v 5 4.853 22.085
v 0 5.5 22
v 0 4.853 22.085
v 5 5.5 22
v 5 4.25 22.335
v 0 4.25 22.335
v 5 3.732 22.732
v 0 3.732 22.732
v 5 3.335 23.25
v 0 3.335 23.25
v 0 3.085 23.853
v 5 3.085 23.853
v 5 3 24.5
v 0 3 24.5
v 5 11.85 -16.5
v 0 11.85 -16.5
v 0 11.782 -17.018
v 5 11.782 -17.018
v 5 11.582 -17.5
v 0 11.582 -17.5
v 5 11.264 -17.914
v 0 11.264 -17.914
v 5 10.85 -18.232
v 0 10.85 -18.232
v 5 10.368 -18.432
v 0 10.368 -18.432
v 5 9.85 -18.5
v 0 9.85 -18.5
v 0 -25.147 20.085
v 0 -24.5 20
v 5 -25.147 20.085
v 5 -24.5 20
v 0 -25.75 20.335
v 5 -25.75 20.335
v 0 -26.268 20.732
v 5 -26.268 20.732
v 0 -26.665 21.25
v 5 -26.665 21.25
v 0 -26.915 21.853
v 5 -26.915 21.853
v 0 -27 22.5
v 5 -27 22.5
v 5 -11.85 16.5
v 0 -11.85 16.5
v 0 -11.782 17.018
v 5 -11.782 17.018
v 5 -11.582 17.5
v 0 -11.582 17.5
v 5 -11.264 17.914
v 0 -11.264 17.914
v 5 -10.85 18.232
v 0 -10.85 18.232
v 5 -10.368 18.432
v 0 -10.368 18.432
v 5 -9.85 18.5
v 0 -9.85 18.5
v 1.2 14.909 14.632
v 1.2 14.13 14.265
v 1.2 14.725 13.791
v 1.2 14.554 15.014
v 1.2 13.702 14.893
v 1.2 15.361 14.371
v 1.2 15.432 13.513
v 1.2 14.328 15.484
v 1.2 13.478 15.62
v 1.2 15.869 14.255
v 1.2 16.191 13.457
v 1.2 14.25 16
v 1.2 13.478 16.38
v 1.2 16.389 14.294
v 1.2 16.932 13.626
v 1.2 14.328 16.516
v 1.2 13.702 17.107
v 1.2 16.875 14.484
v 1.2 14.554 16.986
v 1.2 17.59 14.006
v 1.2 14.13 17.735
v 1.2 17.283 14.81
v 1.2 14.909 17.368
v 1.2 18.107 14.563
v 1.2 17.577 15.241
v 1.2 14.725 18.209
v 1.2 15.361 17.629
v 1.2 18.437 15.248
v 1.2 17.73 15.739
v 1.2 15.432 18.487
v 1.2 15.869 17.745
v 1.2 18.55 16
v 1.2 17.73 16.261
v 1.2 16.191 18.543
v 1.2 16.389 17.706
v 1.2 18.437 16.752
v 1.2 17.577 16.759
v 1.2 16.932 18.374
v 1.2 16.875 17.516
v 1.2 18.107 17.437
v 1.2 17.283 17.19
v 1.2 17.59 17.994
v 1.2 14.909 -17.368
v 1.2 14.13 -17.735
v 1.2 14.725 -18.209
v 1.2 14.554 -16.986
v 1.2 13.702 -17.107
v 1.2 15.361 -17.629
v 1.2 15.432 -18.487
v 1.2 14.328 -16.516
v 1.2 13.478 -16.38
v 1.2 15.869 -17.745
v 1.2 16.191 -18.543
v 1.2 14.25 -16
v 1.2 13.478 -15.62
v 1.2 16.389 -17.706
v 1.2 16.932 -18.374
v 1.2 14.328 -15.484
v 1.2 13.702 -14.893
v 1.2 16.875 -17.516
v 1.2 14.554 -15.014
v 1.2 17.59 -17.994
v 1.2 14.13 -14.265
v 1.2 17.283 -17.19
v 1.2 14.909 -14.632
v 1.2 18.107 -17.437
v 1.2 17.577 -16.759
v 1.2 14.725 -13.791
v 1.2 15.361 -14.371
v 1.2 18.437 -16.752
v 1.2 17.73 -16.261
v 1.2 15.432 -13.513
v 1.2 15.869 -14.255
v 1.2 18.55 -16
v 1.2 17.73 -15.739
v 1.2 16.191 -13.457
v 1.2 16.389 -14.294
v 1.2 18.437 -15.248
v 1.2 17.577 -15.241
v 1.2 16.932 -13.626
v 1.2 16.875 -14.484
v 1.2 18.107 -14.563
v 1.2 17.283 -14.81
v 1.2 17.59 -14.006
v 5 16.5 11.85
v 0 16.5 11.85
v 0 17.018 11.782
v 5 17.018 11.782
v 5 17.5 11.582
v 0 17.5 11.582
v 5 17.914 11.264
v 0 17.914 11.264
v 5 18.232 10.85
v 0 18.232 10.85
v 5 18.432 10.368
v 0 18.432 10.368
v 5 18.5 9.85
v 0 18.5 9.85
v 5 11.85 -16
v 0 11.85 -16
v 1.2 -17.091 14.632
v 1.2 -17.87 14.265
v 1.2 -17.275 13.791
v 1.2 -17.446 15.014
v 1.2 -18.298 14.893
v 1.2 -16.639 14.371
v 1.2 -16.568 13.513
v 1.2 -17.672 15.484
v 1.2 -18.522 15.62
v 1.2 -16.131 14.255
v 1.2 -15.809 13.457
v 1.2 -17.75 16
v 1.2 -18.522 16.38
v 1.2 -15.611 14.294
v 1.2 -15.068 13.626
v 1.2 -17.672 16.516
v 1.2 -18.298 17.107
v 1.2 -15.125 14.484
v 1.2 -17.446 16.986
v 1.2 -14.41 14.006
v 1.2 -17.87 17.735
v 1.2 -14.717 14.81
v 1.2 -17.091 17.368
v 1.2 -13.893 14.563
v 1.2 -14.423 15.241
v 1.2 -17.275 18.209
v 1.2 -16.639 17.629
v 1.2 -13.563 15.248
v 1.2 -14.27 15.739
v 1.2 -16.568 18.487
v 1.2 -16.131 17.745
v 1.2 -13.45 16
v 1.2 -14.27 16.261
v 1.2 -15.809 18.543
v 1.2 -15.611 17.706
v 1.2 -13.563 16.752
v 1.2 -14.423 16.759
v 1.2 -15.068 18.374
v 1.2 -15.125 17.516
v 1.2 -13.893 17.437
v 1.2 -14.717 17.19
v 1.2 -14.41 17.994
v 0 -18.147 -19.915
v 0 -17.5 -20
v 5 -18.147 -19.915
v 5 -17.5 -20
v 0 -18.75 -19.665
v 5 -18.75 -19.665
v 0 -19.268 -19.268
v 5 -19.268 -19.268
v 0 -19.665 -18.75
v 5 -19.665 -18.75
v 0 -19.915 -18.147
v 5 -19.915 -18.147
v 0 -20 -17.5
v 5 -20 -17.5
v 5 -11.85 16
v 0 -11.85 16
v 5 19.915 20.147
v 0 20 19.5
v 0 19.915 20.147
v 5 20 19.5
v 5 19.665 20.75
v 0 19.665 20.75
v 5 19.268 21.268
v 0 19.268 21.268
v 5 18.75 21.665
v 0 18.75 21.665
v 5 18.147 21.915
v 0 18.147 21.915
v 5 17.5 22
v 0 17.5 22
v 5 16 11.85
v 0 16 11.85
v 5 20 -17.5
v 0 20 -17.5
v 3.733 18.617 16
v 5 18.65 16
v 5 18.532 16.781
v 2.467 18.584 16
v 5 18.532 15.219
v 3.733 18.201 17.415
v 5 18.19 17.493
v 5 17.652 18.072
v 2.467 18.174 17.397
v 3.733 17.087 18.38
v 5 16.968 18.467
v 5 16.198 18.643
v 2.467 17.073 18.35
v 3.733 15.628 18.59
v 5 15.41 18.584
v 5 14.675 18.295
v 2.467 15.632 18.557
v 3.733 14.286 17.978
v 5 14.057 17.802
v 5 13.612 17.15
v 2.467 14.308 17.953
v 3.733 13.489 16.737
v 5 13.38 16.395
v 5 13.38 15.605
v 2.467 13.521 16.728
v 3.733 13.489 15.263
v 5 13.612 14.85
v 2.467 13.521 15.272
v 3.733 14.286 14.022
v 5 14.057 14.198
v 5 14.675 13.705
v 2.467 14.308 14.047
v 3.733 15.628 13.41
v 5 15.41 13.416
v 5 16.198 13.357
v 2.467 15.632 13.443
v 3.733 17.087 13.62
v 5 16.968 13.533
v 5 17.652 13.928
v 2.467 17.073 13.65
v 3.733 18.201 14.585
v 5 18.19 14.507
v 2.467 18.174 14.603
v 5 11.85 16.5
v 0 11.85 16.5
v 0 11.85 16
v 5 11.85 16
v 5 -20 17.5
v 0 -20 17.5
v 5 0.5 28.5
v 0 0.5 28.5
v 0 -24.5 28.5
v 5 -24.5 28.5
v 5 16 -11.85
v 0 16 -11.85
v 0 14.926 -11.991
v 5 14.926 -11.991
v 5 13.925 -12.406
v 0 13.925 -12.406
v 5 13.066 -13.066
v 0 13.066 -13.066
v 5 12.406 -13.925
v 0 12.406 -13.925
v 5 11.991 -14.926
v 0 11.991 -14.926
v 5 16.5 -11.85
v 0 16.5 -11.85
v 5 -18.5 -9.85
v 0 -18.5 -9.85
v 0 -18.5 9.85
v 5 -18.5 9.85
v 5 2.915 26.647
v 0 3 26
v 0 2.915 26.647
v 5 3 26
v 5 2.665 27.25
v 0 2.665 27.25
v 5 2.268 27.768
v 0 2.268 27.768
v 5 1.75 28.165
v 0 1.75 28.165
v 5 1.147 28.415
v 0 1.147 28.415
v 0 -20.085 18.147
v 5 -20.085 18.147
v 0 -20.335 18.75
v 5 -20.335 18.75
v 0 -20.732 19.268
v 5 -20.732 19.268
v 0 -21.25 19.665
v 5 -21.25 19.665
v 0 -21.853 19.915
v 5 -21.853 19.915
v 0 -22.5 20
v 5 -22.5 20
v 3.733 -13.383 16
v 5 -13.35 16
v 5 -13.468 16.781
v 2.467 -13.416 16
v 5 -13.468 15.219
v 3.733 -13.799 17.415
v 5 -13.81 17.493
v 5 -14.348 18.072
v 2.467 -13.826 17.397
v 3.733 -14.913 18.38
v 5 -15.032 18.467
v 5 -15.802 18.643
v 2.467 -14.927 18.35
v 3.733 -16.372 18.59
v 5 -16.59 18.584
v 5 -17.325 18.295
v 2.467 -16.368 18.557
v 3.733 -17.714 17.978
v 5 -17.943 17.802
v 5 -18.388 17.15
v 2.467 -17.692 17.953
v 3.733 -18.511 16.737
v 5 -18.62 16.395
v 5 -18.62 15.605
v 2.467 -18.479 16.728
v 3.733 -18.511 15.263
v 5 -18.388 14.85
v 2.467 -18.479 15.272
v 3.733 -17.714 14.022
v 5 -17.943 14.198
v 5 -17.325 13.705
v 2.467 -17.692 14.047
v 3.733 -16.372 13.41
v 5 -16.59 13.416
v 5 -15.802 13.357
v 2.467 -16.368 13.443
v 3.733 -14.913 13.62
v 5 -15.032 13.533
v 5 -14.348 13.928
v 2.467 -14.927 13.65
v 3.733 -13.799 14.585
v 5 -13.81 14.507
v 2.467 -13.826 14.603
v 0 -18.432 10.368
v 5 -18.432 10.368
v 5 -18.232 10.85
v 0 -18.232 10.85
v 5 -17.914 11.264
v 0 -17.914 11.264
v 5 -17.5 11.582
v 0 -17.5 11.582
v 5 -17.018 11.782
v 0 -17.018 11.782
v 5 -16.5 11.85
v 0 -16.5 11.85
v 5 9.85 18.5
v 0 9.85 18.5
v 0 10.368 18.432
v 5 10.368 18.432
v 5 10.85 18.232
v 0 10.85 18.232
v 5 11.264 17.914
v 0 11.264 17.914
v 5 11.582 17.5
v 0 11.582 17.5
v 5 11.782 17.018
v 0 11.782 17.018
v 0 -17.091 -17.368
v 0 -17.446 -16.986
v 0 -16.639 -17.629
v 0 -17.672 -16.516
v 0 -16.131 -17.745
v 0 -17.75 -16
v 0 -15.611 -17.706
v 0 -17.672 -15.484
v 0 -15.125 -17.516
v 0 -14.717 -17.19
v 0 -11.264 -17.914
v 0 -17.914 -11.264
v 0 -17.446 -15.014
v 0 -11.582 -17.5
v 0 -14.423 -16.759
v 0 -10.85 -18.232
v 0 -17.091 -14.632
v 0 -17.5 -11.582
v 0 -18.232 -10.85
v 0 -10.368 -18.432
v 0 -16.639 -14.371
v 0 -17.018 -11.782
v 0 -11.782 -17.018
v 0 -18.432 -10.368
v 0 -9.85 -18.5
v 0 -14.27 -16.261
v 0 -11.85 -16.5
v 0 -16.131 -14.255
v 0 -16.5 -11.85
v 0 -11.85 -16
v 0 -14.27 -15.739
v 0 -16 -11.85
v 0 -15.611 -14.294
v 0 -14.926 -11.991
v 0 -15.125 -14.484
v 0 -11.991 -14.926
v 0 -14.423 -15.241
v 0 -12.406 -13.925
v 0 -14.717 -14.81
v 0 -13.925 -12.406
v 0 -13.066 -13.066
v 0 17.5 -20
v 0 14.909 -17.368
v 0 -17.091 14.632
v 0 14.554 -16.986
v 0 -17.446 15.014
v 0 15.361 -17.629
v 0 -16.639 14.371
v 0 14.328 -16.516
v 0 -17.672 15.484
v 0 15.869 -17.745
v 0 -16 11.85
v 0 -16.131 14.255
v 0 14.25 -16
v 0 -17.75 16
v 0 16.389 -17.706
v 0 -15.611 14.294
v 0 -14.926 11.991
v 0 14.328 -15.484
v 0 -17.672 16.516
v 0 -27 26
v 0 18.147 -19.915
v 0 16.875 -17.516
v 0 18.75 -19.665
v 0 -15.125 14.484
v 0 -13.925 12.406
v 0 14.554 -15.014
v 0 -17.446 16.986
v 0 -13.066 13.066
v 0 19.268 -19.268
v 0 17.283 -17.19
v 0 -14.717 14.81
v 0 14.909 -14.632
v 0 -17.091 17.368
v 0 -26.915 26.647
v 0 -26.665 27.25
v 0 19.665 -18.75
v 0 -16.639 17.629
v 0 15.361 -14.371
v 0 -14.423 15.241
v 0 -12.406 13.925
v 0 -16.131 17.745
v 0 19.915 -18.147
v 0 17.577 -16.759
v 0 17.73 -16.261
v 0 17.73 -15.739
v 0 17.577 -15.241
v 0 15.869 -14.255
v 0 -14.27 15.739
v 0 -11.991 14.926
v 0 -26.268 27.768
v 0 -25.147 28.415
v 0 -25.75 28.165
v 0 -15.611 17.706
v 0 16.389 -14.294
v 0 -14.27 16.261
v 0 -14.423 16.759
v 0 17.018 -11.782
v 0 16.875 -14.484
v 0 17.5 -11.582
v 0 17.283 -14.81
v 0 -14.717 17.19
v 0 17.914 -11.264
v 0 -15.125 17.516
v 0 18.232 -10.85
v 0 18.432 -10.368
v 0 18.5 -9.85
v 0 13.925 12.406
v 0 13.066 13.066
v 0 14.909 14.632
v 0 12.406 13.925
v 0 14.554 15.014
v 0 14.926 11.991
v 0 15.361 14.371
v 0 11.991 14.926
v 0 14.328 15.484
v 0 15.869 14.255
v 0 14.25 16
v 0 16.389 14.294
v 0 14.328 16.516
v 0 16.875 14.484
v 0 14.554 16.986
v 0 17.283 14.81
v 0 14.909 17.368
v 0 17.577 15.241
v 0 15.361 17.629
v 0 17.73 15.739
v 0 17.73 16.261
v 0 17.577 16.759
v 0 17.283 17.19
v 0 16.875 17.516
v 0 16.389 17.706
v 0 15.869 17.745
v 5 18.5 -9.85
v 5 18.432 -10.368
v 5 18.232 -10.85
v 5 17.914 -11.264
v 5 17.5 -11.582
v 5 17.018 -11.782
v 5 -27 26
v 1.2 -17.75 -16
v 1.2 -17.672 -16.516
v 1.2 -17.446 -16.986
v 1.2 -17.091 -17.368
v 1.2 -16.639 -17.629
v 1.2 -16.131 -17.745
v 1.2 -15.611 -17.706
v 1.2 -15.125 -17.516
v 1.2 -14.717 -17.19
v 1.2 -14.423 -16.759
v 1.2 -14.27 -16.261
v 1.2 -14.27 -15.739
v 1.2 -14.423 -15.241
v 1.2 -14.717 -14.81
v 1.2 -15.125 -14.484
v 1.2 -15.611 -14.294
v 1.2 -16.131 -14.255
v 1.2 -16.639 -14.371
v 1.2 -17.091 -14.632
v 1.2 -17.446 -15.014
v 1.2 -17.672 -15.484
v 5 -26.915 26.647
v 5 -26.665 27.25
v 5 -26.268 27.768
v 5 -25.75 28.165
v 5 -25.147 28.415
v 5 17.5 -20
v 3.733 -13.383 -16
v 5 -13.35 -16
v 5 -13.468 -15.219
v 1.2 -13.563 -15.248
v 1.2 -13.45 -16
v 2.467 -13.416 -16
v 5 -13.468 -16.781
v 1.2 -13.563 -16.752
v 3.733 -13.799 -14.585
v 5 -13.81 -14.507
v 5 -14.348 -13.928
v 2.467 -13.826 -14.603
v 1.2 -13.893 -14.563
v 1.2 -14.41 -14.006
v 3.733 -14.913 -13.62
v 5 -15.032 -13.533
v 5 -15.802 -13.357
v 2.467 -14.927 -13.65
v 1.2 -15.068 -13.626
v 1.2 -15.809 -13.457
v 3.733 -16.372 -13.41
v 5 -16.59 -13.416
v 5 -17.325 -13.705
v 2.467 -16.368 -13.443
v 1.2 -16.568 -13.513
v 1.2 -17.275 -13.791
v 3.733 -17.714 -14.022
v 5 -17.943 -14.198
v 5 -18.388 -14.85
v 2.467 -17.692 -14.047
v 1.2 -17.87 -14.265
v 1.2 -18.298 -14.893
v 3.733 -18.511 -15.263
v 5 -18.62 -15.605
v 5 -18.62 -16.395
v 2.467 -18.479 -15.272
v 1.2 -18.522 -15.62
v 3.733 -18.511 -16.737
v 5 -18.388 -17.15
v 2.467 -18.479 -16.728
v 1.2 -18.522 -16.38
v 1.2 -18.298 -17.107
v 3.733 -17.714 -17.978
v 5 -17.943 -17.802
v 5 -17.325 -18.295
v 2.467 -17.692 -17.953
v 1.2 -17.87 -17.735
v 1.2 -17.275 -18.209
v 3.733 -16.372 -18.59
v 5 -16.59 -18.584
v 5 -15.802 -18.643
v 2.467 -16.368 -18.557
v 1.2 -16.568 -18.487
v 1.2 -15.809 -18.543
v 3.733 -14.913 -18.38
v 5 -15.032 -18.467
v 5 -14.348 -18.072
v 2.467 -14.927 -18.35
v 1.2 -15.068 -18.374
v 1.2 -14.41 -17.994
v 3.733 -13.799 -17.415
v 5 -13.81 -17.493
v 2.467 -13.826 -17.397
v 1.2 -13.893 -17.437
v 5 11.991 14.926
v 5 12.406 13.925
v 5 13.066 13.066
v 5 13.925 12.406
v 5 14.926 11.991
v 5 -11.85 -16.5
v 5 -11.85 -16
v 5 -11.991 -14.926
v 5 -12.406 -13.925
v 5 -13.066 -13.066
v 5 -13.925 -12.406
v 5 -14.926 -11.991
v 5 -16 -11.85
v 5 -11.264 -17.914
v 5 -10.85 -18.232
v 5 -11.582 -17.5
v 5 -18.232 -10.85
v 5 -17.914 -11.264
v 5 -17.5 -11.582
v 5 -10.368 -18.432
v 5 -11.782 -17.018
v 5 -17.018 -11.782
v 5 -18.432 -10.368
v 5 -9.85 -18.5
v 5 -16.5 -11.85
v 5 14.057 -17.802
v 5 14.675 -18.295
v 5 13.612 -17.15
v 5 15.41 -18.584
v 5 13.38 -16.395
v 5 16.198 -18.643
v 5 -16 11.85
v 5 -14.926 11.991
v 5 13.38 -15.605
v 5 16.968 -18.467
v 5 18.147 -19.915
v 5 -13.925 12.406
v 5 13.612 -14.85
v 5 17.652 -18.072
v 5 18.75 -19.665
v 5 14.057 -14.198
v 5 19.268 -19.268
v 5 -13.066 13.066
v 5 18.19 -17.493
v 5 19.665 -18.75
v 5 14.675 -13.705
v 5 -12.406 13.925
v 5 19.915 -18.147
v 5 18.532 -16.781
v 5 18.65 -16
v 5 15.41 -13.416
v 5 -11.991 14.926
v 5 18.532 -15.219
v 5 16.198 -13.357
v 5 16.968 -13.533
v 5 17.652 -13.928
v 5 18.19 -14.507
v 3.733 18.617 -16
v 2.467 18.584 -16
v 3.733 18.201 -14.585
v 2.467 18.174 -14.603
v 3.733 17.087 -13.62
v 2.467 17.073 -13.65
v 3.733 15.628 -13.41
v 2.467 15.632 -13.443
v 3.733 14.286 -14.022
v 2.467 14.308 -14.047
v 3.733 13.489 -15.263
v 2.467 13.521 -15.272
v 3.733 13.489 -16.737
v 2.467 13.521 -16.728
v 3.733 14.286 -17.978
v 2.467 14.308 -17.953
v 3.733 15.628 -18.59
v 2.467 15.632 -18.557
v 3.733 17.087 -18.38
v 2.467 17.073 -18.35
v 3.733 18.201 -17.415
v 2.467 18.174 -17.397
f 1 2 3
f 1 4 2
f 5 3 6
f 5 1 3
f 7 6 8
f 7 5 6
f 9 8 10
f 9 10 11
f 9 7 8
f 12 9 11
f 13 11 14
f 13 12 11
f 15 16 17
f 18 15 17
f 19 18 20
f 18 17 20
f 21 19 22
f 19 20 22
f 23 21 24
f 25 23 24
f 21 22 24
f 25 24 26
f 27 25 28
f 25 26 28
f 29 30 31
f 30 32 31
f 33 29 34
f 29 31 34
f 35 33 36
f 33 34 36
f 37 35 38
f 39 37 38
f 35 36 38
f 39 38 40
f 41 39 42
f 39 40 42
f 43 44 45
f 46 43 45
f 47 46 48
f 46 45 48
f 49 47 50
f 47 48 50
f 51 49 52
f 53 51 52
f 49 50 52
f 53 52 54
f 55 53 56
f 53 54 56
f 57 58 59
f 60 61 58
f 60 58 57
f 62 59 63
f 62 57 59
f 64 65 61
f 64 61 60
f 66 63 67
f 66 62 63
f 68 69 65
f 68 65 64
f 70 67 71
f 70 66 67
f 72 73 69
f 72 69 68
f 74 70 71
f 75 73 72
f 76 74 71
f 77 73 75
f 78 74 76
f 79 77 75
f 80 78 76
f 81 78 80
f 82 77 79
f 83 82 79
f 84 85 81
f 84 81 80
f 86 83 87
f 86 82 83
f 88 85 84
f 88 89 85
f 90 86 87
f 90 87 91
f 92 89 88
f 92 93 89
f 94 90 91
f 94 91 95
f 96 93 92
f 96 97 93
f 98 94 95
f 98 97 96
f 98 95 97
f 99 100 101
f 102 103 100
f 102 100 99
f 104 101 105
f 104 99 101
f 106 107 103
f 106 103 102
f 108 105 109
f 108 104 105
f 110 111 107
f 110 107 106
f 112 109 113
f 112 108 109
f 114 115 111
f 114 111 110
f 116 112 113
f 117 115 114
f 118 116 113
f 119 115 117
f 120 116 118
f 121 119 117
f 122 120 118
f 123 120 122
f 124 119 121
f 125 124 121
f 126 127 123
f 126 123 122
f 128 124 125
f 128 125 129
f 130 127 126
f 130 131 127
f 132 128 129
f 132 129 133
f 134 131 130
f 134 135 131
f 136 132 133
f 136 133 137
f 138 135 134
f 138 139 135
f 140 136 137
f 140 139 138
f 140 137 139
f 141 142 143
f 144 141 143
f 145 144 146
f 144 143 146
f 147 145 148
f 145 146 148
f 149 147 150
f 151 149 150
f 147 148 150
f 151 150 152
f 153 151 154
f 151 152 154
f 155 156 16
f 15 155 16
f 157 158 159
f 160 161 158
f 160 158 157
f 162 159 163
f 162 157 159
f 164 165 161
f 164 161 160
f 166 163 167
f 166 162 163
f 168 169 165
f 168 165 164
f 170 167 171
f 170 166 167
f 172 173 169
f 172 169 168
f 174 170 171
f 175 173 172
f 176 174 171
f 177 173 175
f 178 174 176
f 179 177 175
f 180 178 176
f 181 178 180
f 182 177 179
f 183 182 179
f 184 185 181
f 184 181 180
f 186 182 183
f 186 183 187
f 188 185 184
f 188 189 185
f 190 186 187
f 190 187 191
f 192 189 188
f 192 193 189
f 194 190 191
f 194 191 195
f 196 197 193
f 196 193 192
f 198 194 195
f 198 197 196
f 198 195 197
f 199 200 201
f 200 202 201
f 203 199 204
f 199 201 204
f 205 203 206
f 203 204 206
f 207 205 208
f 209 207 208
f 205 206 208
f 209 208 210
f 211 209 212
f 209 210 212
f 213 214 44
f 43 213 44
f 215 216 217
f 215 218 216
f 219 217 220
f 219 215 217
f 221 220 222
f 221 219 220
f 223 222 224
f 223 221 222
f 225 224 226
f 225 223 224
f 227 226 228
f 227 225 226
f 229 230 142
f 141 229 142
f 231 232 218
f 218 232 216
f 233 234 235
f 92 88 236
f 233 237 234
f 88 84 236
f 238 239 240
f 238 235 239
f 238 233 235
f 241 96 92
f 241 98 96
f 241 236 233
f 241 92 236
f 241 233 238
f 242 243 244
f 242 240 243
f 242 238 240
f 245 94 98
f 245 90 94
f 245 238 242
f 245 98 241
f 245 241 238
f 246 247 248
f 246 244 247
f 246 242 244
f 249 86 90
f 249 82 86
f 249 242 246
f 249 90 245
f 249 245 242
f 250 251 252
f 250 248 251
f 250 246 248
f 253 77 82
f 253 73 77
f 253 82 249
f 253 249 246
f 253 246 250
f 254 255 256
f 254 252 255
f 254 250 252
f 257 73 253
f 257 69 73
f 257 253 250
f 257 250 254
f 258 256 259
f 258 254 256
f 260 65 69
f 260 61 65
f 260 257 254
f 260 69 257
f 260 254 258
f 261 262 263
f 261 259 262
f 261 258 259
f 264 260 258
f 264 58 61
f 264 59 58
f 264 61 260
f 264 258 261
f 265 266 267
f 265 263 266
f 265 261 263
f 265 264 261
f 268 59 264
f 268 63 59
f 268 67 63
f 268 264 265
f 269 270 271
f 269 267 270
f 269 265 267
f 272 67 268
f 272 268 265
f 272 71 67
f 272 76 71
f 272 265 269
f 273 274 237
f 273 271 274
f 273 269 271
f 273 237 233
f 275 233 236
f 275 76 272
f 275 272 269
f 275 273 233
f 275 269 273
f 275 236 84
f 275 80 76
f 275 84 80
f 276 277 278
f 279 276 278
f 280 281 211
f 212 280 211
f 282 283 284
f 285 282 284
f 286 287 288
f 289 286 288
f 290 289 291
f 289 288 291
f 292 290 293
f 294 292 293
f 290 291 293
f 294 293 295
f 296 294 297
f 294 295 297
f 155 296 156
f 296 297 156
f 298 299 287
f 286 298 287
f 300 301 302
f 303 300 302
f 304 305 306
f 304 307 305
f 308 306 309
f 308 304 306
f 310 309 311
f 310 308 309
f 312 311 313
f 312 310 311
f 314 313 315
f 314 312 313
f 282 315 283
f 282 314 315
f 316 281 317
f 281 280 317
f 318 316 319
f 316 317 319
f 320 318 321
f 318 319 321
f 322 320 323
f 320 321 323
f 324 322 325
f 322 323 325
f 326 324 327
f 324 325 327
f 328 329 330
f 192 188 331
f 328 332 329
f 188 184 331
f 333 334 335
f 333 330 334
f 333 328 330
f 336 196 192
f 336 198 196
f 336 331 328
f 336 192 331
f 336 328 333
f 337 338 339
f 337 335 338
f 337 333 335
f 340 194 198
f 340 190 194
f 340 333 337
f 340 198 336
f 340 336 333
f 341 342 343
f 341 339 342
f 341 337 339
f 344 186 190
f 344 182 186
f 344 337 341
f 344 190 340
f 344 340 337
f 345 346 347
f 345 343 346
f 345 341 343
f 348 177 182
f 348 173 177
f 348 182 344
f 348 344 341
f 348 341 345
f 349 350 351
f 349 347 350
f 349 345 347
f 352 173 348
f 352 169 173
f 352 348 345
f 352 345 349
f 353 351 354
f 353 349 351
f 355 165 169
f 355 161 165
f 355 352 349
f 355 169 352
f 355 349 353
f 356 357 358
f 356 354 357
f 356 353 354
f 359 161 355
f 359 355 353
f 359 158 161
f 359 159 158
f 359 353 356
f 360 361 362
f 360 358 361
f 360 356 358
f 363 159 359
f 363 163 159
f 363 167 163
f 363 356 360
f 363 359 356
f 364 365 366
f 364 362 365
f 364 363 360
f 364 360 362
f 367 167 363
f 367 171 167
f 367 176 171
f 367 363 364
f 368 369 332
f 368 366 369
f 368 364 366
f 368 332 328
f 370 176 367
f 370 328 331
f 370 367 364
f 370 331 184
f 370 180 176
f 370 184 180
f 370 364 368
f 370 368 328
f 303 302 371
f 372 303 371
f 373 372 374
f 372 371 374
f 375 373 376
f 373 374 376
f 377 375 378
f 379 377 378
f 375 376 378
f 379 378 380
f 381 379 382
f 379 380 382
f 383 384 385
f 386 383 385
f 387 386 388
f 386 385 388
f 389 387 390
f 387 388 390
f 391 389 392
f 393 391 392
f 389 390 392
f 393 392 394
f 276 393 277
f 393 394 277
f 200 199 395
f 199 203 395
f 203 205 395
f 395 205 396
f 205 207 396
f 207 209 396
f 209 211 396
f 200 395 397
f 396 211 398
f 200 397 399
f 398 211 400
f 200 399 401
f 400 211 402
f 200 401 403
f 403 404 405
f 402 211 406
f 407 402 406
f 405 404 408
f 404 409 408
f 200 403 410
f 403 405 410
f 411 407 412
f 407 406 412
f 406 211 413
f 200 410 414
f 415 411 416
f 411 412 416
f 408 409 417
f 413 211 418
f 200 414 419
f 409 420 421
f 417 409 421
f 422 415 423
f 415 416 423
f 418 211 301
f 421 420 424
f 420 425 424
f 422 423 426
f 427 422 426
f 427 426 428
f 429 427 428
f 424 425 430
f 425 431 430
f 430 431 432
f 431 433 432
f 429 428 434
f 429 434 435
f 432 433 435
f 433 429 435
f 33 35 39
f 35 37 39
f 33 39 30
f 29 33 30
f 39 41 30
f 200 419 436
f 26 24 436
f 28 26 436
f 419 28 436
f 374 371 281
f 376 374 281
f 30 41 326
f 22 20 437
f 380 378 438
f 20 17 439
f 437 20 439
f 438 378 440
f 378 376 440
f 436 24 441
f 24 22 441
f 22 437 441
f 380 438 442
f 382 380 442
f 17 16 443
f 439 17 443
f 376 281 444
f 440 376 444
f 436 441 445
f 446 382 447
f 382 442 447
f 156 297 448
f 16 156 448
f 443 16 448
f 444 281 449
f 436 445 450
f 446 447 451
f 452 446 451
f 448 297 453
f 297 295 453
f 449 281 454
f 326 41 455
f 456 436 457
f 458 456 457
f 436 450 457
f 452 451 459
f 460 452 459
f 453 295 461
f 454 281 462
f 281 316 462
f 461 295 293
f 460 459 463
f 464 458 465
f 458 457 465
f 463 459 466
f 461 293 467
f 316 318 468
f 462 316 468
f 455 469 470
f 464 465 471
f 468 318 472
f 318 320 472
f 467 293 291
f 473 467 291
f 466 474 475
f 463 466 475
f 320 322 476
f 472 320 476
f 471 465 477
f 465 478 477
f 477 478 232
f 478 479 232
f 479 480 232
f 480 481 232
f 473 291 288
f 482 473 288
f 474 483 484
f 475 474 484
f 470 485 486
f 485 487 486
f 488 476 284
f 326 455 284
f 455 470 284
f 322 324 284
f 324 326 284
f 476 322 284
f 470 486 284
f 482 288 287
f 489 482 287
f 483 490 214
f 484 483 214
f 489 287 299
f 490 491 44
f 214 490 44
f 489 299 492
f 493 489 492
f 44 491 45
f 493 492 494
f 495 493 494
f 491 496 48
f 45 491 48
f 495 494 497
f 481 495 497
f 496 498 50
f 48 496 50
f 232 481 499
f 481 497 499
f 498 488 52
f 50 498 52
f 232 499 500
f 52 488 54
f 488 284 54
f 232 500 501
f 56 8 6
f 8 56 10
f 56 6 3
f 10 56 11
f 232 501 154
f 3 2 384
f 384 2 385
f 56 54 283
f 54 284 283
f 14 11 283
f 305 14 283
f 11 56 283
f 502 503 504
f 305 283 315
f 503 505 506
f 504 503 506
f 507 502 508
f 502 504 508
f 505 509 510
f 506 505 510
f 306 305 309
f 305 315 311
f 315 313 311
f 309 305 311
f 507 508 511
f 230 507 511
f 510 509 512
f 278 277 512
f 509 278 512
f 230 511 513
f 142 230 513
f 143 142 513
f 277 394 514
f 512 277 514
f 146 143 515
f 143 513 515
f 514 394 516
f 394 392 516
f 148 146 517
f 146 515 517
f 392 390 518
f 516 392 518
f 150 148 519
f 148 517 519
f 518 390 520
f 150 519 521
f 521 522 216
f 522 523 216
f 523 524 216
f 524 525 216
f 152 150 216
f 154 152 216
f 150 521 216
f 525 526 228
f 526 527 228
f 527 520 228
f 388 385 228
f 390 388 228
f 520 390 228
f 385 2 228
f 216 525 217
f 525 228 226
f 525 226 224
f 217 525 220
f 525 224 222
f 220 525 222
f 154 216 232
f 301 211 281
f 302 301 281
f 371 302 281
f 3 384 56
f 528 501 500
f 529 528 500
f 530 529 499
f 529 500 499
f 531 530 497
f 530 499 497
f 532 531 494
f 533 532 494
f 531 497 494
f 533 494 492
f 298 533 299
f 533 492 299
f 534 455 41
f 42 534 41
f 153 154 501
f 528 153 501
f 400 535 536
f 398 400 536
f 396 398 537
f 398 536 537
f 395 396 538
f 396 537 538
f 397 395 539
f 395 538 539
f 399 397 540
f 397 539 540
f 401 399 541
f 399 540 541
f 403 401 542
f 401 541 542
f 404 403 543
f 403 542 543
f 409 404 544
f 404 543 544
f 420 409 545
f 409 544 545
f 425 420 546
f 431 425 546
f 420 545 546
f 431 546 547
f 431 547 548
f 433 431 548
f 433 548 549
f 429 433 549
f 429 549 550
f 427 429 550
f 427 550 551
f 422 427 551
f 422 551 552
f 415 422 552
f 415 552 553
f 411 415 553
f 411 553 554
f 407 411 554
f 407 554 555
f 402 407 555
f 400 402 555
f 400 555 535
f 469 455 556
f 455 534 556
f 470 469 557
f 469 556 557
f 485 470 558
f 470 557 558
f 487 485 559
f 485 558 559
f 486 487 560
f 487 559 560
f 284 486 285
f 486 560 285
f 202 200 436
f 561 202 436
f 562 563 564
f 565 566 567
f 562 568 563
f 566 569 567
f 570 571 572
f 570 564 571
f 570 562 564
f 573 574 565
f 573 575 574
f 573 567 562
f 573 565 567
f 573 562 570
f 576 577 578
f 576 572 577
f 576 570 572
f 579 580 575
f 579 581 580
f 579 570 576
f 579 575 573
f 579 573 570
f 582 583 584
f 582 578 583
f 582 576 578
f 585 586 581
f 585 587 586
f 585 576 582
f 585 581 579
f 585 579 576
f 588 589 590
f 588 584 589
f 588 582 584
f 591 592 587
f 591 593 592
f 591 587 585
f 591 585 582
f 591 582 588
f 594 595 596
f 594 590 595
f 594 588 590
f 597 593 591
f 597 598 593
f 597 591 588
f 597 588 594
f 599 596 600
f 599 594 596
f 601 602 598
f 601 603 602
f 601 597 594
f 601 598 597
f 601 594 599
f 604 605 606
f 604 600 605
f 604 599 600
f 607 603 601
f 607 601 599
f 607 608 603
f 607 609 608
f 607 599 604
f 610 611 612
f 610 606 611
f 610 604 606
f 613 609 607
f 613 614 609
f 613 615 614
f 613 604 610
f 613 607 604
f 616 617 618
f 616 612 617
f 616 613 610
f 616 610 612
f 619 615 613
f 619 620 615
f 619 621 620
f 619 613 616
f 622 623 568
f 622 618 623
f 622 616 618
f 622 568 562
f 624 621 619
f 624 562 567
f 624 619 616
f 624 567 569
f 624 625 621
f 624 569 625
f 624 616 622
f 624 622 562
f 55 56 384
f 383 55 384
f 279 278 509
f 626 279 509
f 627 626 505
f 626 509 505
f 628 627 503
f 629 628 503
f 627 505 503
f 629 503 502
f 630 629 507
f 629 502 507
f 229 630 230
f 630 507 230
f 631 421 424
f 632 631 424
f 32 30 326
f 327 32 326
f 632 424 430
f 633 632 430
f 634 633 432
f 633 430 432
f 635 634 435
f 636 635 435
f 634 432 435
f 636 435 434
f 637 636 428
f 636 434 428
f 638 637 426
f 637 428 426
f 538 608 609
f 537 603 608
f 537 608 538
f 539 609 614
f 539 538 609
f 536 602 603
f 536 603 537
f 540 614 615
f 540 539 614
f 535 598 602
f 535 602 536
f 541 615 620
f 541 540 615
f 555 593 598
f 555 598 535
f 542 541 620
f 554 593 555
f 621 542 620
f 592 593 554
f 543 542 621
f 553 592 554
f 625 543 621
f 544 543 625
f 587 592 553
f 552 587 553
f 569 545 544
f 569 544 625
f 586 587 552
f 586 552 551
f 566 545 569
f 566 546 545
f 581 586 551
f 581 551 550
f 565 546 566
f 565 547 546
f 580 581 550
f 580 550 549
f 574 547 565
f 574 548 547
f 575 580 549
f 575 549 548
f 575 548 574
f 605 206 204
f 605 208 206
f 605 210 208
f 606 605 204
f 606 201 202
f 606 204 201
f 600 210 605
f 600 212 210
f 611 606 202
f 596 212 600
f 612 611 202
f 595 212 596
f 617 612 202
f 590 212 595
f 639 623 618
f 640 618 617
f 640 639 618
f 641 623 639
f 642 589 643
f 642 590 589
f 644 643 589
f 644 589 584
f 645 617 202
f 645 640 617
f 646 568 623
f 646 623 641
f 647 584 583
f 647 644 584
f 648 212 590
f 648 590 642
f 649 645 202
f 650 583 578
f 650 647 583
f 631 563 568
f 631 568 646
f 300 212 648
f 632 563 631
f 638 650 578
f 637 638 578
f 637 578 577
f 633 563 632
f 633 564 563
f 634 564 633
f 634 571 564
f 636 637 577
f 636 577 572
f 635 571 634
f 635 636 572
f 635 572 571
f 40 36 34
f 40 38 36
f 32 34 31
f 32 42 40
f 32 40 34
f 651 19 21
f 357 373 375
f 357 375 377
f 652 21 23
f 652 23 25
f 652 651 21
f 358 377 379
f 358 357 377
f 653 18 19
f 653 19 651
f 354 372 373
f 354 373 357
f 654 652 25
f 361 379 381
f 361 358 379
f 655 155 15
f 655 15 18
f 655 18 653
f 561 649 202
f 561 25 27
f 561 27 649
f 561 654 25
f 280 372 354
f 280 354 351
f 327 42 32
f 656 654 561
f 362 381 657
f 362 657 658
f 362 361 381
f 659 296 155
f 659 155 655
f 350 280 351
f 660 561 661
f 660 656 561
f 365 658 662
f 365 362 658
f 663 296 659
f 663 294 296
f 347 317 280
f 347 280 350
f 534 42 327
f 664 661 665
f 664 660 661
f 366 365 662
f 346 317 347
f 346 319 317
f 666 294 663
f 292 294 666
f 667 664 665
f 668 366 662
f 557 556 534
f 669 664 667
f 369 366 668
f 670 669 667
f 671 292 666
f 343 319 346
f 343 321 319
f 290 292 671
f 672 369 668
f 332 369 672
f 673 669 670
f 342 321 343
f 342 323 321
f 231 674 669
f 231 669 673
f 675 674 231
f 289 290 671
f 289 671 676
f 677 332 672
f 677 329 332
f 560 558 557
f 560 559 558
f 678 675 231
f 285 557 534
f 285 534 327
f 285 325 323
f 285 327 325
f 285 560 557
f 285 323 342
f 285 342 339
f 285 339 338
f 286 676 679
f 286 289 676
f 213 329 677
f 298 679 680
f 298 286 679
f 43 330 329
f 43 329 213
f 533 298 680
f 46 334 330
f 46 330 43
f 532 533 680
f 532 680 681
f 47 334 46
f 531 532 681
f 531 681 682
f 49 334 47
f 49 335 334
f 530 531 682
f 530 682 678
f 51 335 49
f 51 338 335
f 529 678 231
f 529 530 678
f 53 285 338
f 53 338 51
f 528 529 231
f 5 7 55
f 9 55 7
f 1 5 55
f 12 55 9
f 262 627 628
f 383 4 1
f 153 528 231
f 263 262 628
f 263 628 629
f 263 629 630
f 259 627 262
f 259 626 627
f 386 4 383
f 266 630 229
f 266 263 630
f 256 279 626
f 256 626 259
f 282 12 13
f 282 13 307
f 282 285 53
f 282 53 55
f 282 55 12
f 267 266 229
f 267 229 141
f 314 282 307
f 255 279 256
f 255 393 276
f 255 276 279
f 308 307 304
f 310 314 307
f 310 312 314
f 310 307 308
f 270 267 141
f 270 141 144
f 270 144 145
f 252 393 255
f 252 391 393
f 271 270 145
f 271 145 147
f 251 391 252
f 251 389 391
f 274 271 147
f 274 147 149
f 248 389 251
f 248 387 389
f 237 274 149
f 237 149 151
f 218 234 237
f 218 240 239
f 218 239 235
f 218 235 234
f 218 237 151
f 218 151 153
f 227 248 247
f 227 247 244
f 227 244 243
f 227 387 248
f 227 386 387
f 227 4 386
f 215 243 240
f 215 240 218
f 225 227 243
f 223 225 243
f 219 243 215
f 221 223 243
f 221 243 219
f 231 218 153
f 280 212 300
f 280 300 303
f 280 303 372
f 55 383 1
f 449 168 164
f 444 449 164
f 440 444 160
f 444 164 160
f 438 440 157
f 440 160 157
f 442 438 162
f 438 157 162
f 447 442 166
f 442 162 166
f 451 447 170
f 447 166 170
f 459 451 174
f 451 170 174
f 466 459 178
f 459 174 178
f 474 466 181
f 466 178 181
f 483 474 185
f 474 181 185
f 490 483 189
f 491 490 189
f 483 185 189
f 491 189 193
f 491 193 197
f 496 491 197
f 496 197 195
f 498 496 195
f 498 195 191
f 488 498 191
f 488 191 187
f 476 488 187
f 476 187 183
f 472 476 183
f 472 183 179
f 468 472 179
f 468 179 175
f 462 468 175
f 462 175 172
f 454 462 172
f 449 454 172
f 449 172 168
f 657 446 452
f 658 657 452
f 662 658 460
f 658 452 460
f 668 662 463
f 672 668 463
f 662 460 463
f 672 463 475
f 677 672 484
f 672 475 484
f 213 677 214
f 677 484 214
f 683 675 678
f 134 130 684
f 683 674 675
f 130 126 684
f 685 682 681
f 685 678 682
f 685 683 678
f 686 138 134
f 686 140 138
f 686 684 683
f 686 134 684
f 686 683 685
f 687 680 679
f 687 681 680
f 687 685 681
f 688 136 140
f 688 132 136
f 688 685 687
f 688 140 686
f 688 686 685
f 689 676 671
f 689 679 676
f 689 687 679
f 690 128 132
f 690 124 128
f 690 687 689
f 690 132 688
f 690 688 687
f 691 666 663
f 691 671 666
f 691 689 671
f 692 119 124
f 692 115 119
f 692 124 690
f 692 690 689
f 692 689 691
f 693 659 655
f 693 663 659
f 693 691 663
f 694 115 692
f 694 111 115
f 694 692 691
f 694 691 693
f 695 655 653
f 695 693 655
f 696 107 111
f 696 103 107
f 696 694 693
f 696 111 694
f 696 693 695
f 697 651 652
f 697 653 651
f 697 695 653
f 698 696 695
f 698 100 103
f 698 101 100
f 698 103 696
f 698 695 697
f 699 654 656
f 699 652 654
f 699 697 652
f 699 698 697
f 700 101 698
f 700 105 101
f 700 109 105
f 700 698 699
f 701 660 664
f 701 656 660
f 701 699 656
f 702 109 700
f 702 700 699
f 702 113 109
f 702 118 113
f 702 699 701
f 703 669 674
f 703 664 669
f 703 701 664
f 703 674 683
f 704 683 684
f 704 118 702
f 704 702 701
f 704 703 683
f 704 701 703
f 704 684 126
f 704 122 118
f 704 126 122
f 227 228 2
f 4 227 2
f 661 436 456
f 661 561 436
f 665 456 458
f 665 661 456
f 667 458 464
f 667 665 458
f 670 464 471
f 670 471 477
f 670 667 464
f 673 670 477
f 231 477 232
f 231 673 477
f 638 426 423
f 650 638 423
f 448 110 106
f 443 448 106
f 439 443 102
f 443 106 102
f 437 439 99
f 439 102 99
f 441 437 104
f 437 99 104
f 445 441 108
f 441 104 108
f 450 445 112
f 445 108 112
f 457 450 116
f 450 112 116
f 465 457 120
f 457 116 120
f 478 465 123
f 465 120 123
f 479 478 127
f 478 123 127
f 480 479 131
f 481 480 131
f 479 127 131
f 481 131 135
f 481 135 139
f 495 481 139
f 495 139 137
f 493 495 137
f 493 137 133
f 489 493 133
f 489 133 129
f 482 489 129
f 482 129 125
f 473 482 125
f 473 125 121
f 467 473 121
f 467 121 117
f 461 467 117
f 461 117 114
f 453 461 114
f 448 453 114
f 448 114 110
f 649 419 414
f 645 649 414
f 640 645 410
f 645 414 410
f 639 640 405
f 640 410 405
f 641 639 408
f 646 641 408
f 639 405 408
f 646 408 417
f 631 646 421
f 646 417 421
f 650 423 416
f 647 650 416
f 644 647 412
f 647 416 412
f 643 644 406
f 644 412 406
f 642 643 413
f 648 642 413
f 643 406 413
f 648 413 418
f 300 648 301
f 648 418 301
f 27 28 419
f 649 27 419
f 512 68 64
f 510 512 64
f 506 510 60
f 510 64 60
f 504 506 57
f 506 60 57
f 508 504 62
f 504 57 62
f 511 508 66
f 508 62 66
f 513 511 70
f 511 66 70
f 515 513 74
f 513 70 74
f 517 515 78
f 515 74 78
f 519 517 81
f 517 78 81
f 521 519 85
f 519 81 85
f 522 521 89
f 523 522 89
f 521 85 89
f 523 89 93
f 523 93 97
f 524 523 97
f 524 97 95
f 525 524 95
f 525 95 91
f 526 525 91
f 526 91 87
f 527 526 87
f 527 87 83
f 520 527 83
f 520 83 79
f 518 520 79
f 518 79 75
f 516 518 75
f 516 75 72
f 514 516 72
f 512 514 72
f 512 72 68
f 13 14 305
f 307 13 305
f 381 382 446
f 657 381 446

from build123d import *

# Parameters (mm, degrees)
F0_R     = 2.15
F0_W     = 17
F0_H     = 2
F0_W_2   = 23
F1_DEPTH = 5
F2_R     = 2.65
F3_DEPTH = 3.8
F3_TAPER = 1.5
F4_D     = 3.5
F5_R     = 2.5


with BuildPart() as f1:
    # F0 (on Right) → F1 (new body)
    with BuildSketch(Plane.YZ):
        Polygon((-20, -20), (20, -20), (20, 20), (3, 20), (-20, 20), align=None)
        with Locations((-16, -16)):
            Circle(F0_R, mode=Mode.SUBTRACT)
        with Locations((16, -16)):
            Circle(F0_R, mode=Mode.SUBTRACT)
        with BuildLine():
            Line((11.85, 16.5), (11.85, 16))
            ThreePointArc((11.85, 16), (13.0655068581, 13.0655068581), (16, 11.85))
            Line((16, 11.85), (16.5, 11.85))
            ThreePointArc((16.5, 11.85), (17.9142135624, 11.2642135624), (18.5, 9.85))
            Line((18.5, 9.85), (18.5, -9.85))
            ThreePointArc((18.5, -9.85), (17.9142135624, -11.2642135624), (16.5, -11.85))
            Line((16.5, -11.85), (16, -11.85))
            ThreePointArc((16, -11.85), (13.0655068581, -13.0655068581), (11.85, -16))
            Line((11.85, -16), (11.85, -16.5))
            ThreePointArc((11.85, -16.5), (11.2642135624, -17.9142135624), (9.85, -18.5))
            Line((9.85, -18.5), (-9.85, -18.5))
            ThreePointArc((-9.85, -18.5), (-11.2642135624, -17.9142135624), (-11.85, -16.5))
            Line((-11.85, -16.5), (-11.85, -16))
            ThreePointArc((-11.85, -16), (-13.0655068581, -13.0655068581), (-16, -11.85))
            Line((-16, -11.85), (-16.5, -11.85))
            ThreePointArc((-16.5, -11.85), (-17.9142135624, -11.2642135624), (-18.5, -9.85))
            Line((-18.5, -9.85), (-18.5, 9.85))
            ThreePointArc((-18.5, 9.85), (-17.9142135624, 11.2642135624), (-16.5, 11.85))
            Line((-16.5, 11.85), (-16, 11.85))
            ThreePointArc((-16, 11.85), (-13.0655068581, 13.0655068581), (-11.85, 16))
            Line((-11.85, 16), (-11.85, 16.5))
            ThreePointArc((-11.85, 16.5), (-11.2642135624, 17.9142135624), (-9.85, 18.5))
            Line((-9.85, 18.5), (9.85, 18.5))
            ThreePointArc((9.85, 18.5), (11.2642135624, 17.9142135624), (11.85, 16.5))
        make_face(mode=Mode.SUBTRACT)
        with Locations((-16, 16)):
            Circle(F0_R, mode=Mode.SUBTRACT)
        with Locations((16, 16)):
            Circle(F0_R, mode=Mode.SUBTRACT)
        with Locations((11.5, 21)):
            Rectangle(F0_W, F0_H)
        with Locations((-8.5, 21)):
            Rectangle(F0_W_2, F0_H)
        Polygon((-27, 20), (-20, 20), (-20, 22), (3, 22), (3, 28.5), (-27, 28.5), align=None)
        with Locations((-16, 16)):
            Circle(F0_R)
        with Locations((16, 16)):
            Circle(F0_R)
        with Locations((-16, -16)):
            Circle(F0_R)
        with Locations((16, -16)):
            Circle(F0_R)
    extrude(amount=F1_DEPTH)

    # F2 (on face) → F3 (cut)
    with BuildSketch(Plane.YZ.offset(5)):
        with Locations((-16, 16)):
            Circle(F2_R)
        with Locations((16, 16)):
            Circle(F2_R)
        with Locations((16, -16)):
            Circle(F2_R)
        with Locations((-16, -16)):
            Circle(F2_R)
    extrude(amount=-F3_DEPTH, taper=F3_TAPER, mode=Mode.SUBTRACT)

    # F4 (through all)
    with Locations(Plane(origin=(0, 0, 0), x_dir=(0, 1, 0), z_dir=(-1, 0, 0))):
        with Locations((-16, -16), (16, -16), (16, 16), (-16, 16)):
            Hole(F4_D / 2)

    # F5
    f5_edges = [f1.edges().sort_by_distance(p)[0] for p in [
        (2.5, 3, 22),
        (2.5, 3, 28.5),
        (2.5, 20, 22),
        (2.5, 20, -20),
        (2.5, -20, -20),
        (2.5, -20, 20),
        (2.5, -27, 20),
        (2.5, -27, 28.5),
    ]]
    fillet(f5_edges, radius=F5_R)


solid = f1.part
